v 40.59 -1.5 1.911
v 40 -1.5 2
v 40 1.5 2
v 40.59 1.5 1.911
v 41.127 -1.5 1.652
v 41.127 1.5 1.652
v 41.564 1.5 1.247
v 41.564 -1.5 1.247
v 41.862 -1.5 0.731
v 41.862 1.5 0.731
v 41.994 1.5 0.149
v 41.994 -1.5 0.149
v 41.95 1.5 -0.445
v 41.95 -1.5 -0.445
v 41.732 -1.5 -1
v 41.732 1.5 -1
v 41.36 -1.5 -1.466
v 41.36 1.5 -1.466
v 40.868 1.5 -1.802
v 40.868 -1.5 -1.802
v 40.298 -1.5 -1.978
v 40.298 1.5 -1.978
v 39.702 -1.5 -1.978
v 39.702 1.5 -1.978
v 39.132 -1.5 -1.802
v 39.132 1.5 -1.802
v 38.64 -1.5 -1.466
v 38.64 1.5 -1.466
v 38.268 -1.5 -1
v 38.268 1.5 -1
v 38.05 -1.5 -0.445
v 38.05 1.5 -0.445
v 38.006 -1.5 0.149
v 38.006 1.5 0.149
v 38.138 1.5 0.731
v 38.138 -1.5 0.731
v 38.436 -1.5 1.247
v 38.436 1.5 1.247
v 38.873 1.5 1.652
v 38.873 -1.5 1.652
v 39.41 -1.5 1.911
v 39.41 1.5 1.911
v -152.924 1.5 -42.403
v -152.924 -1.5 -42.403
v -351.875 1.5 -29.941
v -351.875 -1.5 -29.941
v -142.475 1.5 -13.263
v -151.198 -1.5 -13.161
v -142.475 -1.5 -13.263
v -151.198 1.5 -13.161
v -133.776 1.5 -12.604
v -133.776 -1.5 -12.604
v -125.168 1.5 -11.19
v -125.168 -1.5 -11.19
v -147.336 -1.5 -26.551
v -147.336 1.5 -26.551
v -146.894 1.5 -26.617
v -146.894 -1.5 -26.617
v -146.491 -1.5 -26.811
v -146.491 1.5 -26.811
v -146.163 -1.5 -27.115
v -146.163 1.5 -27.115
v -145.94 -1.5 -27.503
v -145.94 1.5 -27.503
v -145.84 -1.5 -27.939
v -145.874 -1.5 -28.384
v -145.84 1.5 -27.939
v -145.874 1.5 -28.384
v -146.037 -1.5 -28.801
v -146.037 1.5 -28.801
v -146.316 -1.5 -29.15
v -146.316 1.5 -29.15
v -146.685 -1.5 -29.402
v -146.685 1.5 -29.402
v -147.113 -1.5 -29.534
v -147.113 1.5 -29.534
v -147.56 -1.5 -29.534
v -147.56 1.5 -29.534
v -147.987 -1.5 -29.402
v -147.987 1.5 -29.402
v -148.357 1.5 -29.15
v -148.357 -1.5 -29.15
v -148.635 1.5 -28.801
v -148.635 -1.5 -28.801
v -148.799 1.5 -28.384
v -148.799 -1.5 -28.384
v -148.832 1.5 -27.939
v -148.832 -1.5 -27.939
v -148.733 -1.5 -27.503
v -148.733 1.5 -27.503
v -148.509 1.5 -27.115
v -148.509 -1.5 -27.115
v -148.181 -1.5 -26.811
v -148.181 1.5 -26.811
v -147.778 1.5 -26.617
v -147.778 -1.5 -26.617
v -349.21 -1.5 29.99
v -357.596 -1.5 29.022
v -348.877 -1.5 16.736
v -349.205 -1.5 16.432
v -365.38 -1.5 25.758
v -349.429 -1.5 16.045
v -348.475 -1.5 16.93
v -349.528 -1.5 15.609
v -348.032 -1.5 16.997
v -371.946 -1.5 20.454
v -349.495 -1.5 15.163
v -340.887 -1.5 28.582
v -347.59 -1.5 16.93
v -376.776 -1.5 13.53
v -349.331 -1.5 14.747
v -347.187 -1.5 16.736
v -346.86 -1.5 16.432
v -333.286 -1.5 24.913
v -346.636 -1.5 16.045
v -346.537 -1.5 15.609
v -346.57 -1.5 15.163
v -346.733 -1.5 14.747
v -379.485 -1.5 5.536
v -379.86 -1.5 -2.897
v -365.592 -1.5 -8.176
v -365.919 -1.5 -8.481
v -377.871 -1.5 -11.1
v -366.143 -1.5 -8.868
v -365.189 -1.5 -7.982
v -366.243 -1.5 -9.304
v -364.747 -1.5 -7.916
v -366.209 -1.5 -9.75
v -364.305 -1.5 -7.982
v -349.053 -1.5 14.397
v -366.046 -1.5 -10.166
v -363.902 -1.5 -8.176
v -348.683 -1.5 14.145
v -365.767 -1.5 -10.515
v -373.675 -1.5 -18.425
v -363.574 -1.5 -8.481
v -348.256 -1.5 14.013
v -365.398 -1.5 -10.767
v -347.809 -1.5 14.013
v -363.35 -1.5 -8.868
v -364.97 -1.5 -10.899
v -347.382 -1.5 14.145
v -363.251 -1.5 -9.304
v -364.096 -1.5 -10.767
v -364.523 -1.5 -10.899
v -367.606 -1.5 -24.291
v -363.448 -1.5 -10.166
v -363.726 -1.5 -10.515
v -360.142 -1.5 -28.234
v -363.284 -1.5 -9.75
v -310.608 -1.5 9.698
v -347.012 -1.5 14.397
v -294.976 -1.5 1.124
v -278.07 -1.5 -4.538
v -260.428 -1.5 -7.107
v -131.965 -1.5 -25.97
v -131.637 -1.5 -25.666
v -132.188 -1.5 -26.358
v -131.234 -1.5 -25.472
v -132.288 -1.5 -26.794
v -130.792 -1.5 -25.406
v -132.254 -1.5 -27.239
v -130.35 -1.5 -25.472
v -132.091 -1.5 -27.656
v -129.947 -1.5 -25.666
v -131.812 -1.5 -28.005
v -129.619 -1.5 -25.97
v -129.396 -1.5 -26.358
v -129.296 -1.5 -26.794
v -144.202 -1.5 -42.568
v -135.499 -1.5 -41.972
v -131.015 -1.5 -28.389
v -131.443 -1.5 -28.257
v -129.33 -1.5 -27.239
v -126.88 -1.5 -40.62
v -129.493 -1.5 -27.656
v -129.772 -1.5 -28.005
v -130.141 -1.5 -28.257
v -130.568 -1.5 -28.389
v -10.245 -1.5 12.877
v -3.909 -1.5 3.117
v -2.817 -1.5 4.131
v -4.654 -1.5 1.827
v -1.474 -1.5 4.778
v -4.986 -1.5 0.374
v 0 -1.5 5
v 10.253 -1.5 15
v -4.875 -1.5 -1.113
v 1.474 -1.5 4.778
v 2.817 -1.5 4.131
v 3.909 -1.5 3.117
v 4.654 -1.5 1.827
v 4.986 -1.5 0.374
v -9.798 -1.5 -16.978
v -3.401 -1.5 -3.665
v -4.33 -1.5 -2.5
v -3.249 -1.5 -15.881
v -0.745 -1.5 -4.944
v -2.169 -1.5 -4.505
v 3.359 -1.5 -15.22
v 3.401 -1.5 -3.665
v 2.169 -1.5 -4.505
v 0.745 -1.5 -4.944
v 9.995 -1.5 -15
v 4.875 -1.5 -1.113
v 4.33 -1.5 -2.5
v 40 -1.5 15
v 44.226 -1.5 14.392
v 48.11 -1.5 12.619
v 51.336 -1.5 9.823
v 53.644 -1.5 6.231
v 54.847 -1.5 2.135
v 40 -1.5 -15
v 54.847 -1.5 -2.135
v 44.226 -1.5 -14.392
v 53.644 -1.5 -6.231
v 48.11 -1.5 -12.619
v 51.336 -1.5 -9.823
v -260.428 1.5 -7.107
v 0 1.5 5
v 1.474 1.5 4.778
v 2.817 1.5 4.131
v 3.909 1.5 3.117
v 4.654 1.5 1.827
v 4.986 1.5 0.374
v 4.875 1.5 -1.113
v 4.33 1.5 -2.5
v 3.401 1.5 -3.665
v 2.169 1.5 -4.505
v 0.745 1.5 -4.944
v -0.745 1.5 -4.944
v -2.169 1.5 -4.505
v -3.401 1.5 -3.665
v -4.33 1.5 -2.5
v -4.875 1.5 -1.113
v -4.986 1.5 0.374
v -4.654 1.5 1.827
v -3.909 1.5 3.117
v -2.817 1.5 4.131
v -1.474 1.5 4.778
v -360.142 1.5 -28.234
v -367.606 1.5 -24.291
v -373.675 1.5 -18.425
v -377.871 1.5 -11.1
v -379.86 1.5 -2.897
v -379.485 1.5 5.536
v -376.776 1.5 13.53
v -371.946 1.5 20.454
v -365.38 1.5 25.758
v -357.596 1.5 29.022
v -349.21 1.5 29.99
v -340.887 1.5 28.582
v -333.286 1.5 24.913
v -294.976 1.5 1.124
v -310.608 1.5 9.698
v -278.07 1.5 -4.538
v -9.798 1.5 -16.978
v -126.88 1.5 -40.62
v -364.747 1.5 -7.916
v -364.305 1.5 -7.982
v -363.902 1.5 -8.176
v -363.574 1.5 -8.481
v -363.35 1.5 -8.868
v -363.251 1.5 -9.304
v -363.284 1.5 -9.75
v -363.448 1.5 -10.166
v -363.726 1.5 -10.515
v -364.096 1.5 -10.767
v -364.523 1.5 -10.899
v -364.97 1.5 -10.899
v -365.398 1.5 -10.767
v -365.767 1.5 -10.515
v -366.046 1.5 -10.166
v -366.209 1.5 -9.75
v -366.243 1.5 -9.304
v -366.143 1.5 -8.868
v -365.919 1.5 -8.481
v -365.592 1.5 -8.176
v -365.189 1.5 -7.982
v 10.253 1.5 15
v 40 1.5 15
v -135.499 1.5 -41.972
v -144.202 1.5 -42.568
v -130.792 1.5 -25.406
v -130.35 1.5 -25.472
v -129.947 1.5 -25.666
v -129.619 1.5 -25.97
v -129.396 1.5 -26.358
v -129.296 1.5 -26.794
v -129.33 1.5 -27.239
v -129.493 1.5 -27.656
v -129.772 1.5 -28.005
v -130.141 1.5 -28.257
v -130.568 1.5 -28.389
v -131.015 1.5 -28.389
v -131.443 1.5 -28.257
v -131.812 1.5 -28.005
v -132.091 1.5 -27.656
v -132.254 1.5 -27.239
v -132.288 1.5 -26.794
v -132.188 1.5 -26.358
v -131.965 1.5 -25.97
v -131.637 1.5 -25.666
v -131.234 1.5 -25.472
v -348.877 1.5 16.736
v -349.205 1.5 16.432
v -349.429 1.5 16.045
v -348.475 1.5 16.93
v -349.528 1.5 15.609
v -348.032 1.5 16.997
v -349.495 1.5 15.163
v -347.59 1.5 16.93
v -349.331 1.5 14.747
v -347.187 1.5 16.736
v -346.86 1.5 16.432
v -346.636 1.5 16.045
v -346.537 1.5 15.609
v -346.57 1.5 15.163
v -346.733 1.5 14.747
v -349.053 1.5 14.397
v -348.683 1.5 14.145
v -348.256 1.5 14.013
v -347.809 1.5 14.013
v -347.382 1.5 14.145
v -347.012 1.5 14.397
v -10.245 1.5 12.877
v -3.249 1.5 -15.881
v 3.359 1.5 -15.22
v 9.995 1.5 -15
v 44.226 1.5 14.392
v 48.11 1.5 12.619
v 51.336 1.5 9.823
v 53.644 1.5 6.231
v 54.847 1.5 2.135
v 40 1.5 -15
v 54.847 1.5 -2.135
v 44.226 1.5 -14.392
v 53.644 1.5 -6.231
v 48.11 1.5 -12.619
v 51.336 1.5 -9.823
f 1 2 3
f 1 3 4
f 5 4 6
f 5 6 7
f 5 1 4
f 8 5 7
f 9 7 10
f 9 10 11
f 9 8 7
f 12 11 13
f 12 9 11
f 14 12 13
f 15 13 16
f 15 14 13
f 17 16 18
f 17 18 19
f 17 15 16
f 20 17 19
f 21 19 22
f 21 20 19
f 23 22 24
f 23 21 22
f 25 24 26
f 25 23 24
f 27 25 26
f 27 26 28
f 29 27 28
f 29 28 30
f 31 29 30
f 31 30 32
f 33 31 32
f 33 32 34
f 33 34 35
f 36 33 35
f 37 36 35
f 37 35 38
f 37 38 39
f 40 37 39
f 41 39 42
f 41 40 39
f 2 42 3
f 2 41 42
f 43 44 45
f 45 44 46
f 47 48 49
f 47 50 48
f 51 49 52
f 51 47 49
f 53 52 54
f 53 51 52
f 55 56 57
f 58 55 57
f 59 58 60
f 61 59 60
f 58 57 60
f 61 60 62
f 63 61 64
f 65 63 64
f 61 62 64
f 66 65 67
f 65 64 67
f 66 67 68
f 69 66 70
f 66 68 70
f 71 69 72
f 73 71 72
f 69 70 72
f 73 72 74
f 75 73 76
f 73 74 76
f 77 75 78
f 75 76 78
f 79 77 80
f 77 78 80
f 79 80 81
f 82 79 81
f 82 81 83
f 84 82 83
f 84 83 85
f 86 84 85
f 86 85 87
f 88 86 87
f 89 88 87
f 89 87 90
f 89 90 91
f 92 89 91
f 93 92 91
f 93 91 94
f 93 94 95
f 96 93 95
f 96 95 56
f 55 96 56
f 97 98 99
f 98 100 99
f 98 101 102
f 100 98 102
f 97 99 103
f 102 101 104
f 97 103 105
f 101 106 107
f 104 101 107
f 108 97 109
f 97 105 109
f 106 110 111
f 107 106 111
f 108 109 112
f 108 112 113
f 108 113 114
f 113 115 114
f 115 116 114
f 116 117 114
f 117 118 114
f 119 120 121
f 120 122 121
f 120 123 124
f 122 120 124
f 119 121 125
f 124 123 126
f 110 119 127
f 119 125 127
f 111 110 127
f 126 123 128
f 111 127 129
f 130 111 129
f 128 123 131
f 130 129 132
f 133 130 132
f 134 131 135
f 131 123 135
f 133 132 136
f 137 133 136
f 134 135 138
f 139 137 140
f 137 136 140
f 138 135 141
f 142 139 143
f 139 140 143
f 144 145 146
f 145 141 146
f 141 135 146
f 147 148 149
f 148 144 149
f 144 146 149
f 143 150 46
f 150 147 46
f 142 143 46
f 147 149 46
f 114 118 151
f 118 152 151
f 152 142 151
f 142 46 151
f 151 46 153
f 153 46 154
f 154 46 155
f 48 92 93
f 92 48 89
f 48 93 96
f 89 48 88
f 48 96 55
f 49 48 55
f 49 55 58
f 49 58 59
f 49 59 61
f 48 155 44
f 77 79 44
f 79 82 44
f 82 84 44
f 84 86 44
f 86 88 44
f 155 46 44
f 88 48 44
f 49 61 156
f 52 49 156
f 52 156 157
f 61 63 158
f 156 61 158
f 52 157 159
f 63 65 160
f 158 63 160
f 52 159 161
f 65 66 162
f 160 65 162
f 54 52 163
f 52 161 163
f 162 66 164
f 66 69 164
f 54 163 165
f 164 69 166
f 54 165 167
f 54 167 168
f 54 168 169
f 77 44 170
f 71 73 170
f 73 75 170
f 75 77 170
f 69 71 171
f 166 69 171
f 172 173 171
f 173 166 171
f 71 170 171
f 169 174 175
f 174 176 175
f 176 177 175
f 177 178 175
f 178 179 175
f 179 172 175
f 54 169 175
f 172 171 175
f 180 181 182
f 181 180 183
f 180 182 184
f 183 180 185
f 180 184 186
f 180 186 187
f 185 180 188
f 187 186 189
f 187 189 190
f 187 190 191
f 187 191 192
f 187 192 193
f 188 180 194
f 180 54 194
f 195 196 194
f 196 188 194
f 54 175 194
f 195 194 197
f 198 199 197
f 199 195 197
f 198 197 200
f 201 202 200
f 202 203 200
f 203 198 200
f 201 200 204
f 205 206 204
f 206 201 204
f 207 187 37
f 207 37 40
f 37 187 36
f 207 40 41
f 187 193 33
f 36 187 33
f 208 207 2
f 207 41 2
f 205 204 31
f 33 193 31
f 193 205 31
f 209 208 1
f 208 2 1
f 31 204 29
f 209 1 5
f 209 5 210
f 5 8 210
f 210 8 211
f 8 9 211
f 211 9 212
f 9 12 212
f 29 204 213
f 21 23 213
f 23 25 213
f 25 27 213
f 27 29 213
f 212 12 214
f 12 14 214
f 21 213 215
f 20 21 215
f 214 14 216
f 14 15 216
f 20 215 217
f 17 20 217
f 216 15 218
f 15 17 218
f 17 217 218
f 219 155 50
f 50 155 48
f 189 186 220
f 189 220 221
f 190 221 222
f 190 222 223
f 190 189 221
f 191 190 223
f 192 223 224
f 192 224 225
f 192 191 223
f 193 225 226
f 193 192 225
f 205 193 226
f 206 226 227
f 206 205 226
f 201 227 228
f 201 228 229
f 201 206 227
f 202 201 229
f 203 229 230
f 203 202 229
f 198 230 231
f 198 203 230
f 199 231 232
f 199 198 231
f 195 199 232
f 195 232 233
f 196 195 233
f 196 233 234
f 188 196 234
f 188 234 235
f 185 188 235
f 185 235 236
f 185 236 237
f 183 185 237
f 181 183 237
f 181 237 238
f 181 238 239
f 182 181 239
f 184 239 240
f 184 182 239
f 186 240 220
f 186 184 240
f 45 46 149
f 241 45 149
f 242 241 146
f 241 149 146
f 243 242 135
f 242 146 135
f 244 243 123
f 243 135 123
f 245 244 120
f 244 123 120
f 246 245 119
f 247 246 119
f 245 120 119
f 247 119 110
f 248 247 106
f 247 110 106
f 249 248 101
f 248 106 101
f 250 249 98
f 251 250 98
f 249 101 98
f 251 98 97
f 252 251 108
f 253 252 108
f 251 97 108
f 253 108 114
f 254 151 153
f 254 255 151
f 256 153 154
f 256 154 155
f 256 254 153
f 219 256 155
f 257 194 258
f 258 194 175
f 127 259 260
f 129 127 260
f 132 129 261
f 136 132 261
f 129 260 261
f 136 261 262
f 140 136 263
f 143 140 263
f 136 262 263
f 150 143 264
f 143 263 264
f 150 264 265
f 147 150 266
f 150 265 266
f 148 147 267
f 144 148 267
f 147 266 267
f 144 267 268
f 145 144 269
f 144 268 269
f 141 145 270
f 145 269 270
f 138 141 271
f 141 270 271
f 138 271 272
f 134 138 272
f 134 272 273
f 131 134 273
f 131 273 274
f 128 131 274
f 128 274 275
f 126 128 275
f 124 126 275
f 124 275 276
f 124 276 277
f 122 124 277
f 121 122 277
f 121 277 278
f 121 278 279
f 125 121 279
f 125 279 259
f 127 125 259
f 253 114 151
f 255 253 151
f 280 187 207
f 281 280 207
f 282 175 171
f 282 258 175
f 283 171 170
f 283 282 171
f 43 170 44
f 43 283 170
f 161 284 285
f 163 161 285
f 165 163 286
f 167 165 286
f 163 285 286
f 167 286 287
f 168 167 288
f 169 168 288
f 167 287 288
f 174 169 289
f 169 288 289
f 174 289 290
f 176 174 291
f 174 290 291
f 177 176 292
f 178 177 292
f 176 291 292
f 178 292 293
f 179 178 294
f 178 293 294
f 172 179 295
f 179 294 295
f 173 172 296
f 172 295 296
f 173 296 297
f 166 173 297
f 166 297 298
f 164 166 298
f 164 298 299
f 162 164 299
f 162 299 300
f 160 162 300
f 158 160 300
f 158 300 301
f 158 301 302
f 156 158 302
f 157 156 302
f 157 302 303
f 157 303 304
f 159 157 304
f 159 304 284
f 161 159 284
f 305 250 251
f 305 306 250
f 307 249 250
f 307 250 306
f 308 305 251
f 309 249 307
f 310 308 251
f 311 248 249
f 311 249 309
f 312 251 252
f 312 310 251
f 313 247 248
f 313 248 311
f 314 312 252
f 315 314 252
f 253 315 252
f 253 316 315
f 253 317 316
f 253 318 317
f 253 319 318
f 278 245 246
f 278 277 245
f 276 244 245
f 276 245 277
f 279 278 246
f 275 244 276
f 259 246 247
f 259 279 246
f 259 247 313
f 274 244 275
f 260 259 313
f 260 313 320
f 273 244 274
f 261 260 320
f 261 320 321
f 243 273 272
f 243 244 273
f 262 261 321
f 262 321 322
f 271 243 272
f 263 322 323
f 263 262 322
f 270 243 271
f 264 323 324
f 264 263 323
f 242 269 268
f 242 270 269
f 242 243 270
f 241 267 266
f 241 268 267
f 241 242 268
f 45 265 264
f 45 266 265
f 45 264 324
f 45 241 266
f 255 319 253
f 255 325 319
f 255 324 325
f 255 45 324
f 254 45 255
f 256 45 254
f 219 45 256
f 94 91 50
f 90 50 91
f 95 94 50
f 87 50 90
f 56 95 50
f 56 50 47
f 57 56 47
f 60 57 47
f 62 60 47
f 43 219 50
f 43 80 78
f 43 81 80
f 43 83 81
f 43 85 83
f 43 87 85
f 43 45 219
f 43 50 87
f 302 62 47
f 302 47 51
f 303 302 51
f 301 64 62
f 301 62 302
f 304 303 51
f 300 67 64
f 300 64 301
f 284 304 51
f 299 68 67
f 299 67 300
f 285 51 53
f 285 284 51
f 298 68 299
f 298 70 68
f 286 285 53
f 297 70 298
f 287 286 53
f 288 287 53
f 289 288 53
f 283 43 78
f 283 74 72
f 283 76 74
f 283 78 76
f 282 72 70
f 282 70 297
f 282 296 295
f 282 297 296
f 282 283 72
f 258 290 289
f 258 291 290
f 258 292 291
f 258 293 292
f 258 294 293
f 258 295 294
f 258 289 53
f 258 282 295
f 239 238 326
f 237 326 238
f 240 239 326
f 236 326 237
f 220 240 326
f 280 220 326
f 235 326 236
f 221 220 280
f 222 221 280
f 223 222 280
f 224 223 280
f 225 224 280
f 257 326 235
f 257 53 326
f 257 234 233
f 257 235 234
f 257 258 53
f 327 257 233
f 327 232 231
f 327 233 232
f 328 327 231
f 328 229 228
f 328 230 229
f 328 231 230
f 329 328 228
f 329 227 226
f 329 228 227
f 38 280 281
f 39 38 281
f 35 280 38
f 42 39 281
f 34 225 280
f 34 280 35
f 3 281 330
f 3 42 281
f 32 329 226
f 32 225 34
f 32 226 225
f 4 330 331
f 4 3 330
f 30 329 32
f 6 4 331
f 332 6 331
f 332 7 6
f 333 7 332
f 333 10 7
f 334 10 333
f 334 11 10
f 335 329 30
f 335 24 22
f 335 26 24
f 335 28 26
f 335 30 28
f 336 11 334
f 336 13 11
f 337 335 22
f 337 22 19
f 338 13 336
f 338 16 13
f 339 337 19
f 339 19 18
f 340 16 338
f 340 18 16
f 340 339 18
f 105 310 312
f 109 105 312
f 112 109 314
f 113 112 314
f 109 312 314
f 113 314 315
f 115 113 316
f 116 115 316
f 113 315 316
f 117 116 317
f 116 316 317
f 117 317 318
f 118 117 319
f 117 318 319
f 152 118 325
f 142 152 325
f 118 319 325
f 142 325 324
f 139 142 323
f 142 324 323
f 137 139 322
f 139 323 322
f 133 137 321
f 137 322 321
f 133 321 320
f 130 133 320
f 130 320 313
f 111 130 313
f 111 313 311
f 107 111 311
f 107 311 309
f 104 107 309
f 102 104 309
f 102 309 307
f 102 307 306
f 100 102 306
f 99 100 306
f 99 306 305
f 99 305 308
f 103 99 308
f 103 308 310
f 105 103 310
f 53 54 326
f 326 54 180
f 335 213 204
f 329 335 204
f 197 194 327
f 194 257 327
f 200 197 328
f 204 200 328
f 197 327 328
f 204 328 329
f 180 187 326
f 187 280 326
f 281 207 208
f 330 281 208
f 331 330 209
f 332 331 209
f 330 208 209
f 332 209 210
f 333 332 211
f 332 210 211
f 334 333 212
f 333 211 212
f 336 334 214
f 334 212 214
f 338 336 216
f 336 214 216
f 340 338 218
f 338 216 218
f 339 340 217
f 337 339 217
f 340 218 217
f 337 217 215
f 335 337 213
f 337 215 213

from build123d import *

# Parameters (mm, degrees)
BOSS_EXTRUDE1_DEPTH      = 1.5
BOSS_EXTRUDE1_DEPTH_BACK = 1.5
SKETCH1_R                = 5
SKETCH1_R_2              = 2
FILLET1_R                = 100
SKETCH2_R                = 1.5
CUT_EXTRUDE1_DEPTH       = 10


with BuildPart() as part:
    # Sketch1 → Boss-Extrude1 (new, two sides: drawn at the far end of the back side and taken through both)
    with BuildSketch(Plane(origin=(0, 0, 0), x_dir=(1, 0, 0), z_dir=(0, 1, 0)).offset(-BOSS_EXTRUDE1_DEPTH_BACK)):
        with BuildLine():
            Line((-138.053278996, 13.889014505), (-5.919683, -13.782501703))
            Line((-5.919683, -13.782501703), (0, -15))
            Line((0, -15), (40, -15))
            ThreePointArc((40, -15), (55, 0), (40, 15))
            Line((40, 15), (0, 15))
            Line((0, 15), (-139.784941349, 43.225909045))
            Line((-139.784941349, 43.225909045), (-351.875415017, 29.941322925))
            ThreePointArc((-351.875415017, 29.941322925), (-378.412739548, -9.628926804), (-333.285739517, -24.912516864))
            Line((-333.285739517, -24.912516864), (-287.823465989, 5.588948968))
            Line((-287.823465989, 5.588948968), (-138.053278996, 13.889014505))
        make_face()
        Circle(SKETCH1_R, mode=Mode.SUBTRACT)
        with Locations((40, 0)):
            Circle(SKETCH1_R_2, mode=Mode.SUBTRACT)
    extrude(amount=BOSS_EXTRUDE1_DEPTH + BOSS_EXTRUDE1_DEPTH_BACK)

    # Fillet1
    fillet1_edges = [part.edges().sort_by_distance(p)[0] for p in [
        (0, 0, -15),
        (-139.784941349, 0, -43.225909045),
        (-138.053278996, 0, -13.889014505),
        (-287.823465989, 0, -5.588948968),
        (0, 0, 15),
    ]]
    fillet(fillet1_edges, radius=FILLET1_R)

    # Sketch2 → Cut-Extrude1 (cut)
    with BuildSketch(Plane(origin=(0, 1.5, 0), x_dir=(1, 0, 0), z_dir=(0, 1, 0))):
        with Locations((-147.336246923, 28.050603479)):
            Circle(SKETCH2_R)
        with Locations((-130.791911053, 26.905656844)):
            Circle(SKETCH2_R)
        with Locations((-364.746711272, 9.415773639)):
            Circle(SKETCH2_R)
        with Locations((-348.032450789, -15.496743225)):
            Circle(SKETCH2_R)
    extrude(amount=-CUT_EXTRUDE1_DEPTH, mode=Mode.SUBTRACT)


solid = part.part
